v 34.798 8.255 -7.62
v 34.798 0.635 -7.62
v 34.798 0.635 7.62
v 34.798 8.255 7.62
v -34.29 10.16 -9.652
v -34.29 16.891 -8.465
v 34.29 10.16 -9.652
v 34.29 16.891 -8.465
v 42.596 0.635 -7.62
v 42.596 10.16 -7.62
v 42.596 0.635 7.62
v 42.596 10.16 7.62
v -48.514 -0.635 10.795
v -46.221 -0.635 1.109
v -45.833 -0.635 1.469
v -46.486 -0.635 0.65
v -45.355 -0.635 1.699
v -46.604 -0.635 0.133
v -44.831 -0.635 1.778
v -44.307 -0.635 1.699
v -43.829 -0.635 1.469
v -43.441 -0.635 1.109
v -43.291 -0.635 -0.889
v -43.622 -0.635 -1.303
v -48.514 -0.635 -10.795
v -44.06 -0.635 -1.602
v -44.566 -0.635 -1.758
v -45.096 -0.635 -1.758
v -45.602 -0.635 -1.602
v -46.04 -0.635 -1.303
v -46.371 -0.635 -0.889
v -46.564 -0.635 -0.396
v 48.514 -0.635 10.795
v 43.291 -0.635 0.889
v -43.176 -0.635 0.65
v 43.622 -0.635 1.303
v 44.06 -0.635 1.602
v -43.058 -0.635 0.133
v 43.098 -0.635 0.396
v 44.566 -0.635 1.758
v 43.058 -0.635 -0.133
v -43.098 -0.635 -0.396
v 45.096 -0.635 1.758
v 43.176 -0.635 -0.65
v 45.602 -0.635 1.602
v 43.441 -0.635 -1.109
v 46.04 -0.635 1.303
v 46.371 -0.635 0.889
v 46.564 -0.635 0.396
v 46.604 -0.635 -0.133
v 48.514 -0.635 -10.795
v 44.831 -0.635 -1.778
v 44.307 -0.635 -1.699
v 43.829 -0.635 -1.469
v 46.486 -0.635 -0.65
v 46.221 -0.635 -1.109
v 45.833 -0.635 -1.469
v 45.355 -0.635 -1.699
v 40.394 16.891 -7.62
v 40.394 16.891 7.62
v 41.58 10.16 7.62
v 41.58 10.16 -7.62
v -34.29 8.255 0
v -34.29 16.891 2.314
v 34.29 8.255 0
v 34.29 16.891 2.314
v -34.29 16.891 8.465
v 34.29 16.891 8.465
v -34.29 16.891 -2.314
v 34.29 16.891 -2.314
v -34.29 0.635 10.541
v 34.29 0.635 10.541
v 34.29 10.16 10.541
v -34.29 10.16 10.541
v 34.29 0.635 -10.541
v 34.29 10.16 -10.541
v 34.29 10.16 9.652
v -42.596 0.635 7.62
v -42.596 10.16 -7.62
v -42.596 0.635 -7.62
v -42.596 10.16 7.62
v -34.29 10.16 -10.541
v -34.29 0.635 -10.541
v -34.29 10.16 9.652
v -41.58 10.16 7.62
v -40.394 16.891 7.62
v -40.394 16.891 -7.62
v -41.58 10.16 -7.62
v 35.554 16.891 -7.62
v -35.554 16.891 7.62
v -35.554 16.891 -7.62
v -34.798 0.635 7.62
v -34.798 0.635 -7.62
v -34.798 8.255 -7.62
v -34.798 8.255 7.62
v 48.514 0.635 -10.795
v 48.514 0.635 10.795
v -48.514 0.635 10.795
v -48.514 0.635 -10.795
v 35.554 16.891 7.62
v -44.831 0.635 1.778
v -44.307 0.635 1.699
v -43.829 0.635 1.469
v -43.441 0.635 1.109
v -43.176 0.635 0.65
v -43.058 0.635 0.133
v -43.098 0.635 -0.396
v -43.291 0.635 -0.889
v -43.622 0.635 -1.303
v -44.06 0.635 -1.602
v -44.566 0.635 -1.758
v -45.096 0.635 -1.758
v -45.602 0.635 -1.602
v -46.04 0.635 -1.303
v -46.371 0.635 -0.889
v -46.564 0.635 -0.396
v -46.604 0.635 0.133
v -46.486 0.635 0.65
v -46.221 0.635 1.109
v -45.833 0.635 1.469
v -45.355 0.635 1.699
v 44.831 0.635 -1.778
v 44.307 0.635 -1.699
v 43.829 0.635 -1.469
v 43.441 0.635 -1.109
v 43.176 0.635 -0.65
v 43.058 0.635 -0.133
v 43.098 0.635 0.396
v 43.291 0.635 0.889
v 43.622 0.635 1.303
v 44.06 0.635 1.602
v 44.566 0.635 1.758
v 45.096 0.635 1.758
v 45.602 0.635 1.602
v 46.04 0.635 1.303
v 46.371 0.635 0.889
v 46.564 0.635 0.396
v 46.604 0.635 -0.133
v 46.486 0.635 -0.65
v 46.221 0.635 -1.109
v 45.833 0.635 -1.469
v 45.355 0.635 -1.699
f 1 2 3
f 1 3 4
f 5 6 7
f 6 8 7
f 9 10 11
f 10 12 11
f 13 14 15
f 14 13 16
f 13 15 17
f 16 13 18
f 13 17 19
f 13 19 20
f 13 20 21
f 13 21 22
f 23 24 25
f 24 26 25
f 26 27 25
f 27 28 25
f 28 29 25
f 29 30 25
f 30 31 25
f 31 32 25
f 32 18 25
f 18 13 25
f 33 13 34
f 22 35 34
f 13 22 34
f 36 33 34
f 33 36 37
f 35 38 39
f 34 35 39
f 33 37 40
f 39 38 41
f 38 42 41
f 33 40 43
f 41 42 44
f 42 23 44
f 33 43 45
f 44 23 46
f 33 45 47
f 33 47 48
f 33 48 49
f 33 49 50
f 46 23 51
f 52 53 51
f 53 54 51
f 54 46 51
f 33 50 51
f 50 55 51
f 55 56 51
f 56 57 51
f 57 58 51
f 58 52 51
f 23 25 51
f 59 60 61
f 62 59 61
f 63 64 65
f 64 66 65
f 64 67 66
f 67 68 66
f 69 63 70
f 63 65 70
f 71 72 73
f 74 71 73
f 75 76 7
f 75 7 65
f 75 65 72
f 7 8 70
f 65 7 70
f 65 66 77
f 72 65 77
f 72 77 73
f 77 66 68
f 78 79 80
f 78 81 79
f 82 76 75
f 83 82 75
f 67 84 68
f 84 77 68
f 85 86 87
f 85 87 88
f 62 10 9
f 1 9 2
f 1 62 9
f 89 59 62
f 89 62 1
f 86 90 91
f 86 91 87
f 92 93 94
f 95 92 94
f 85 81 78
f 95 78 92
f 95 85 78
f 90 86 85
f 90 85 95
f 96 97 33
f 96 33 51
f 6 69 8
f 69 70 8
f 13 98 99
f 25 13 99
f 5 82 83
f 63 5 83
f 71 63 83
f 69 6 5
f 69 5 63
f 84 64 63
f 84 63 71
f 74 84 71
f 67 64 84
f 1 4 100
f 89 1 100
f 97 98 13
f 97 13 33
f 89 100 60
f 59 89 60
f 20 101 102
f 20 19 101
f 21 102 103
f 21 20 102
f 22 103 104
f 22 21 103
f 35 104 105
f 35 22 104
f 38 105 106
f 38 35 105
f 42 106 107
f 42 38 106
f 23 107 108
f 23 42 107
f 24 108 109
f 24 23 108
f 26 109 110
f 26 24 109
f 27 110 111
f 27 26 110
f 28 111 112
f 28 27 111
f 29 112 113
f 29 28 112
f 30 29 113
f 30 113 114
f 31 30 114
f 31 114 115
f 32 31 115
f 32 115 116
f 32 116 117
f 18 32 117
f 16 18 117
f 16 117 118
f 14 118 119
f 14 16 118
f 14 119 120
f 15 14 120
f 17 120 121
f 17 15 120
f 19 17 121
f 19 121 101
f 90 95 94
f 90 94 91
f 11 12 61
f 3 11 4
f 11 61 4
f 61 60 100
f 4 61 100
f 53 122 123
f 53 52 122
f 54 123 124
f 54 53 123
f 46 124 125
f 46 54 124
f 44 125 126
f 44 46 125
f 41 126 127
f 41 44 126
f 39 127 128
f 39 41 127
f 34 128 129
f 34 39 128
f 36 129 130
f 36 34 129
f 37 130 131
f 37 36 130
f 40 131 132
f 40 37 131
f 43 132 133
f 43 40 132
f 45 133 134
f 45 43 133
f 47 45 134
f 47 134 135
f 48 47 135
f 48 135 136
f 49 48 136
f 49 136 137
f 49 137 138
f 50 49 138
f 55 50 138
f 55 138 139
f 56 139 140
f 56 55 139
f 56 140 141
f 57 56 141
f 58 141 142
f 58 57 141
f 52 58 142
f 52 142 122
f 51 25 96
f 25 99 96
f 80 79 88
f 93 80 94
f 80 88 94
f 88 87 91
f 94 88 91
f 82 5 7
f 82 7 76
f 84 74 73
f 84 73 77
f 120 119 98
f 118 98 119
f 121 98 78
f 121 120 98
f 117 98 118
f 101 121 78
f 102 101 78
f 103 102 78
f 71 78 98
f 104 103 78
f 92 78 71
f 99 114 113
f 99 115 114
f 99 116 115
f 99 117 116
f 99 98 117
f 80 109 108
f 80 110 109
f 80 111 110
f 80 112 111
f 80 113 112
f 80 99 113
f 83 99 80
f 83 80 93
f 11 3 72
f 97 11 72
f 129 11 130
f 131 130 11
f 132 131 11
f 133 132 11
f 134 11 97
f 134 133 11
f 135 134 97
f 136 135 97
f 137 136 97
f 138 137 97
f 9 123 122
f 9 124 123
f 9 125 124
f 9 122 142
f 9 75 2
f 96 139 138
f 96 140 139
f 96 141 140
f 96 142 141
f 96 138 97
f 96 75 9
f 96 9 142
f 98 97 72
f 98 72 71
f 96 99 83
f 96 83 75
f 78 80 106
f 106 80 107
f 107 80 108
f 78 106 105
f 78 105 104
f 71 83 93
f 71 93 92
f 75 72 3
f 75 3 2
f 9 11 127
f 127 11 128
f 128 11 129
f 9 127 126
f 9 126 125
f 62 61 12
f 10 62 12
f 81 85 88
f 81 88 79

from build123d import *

# Parameters (mm, degrees)
SKETCH1_W           = 97.028
SKETCH1_H           = 21.59
SKETCH1_R           = 1.778
BOSS_EXTRUDE1_DEPTH = 0.635
BOSS_EXTRUDE2_DEPTH = 34.29
BOSS_EXTRUDE3_DEPTH = 7.62


with BuildPart() as part:
    # Sketch1 → Boss-Extrude1 (new, symmetric)
    with BuildSketch(Plane(origin=(0, 0, 0), x_dir=(1, 0, 0), z_dir=(0, 1, 0))):
        Rectangle(SKETCH1_W, SKETCH1_H)
        with Locations(Location((-44.831, 0, 0), (0, 0, 270))):
            Circle(SKETCH1_R, mode=Mode.SUBTRACT)
        with Locations(Location((44.831, 0, 0), (0, 0, 90))):
            Circle(SKETCH1_R, mode=Mode.SUBTRACT)
    extrude(amount=BOSS_EXTRUDE1_DEPTH, both=True)

    # Sketch2 → Boss-Extrude2 (add, symmetric)
    with BuildSketch(Plane(origin=(0, 0, 0), x_dir=(0, 0, -1), z_dir=(1, 0, 0))):
        Polygon((-10.541, 0.635), (-10.541, 10.16), (-9.652, 10.16), (-8.465143093, 16.891), (-2.314009226, 16.891), (0, 8.255), (2.314009226, 16.891), (8.465143093, 16.891), (9.652, 10.16), (10.541, 10.16), (10.541, 0.635), align=None)
    extrude(amount=BOSS_EXTRUDE2_DEPTH, both=True)

    # Sketch3 → Boss-Extrude3 (add, symmetric)
    with BuildSketch(Plane.XY):
        Polygon((-34.798, 0.635), (-34.798, 8.255), (-35.553552098, 16.891), (-40.393571647, 16.891), (-41.580428554, 10.16), (-42.596428554, 10.16), (-42.596428554, 0.635), align=None)
    boss_extrude3 = extrude(amount=BOSS_EXTRUDE3_DEPTH, both=True)

    # Mirror1: Boss-Extrude3 across plane
    add(boss_extrude3.mirror(Plane(origin=(0, 0, 0), x_dir=(0, 0, 1), z_dir=(1, 0, 0))))


solid = part.part
